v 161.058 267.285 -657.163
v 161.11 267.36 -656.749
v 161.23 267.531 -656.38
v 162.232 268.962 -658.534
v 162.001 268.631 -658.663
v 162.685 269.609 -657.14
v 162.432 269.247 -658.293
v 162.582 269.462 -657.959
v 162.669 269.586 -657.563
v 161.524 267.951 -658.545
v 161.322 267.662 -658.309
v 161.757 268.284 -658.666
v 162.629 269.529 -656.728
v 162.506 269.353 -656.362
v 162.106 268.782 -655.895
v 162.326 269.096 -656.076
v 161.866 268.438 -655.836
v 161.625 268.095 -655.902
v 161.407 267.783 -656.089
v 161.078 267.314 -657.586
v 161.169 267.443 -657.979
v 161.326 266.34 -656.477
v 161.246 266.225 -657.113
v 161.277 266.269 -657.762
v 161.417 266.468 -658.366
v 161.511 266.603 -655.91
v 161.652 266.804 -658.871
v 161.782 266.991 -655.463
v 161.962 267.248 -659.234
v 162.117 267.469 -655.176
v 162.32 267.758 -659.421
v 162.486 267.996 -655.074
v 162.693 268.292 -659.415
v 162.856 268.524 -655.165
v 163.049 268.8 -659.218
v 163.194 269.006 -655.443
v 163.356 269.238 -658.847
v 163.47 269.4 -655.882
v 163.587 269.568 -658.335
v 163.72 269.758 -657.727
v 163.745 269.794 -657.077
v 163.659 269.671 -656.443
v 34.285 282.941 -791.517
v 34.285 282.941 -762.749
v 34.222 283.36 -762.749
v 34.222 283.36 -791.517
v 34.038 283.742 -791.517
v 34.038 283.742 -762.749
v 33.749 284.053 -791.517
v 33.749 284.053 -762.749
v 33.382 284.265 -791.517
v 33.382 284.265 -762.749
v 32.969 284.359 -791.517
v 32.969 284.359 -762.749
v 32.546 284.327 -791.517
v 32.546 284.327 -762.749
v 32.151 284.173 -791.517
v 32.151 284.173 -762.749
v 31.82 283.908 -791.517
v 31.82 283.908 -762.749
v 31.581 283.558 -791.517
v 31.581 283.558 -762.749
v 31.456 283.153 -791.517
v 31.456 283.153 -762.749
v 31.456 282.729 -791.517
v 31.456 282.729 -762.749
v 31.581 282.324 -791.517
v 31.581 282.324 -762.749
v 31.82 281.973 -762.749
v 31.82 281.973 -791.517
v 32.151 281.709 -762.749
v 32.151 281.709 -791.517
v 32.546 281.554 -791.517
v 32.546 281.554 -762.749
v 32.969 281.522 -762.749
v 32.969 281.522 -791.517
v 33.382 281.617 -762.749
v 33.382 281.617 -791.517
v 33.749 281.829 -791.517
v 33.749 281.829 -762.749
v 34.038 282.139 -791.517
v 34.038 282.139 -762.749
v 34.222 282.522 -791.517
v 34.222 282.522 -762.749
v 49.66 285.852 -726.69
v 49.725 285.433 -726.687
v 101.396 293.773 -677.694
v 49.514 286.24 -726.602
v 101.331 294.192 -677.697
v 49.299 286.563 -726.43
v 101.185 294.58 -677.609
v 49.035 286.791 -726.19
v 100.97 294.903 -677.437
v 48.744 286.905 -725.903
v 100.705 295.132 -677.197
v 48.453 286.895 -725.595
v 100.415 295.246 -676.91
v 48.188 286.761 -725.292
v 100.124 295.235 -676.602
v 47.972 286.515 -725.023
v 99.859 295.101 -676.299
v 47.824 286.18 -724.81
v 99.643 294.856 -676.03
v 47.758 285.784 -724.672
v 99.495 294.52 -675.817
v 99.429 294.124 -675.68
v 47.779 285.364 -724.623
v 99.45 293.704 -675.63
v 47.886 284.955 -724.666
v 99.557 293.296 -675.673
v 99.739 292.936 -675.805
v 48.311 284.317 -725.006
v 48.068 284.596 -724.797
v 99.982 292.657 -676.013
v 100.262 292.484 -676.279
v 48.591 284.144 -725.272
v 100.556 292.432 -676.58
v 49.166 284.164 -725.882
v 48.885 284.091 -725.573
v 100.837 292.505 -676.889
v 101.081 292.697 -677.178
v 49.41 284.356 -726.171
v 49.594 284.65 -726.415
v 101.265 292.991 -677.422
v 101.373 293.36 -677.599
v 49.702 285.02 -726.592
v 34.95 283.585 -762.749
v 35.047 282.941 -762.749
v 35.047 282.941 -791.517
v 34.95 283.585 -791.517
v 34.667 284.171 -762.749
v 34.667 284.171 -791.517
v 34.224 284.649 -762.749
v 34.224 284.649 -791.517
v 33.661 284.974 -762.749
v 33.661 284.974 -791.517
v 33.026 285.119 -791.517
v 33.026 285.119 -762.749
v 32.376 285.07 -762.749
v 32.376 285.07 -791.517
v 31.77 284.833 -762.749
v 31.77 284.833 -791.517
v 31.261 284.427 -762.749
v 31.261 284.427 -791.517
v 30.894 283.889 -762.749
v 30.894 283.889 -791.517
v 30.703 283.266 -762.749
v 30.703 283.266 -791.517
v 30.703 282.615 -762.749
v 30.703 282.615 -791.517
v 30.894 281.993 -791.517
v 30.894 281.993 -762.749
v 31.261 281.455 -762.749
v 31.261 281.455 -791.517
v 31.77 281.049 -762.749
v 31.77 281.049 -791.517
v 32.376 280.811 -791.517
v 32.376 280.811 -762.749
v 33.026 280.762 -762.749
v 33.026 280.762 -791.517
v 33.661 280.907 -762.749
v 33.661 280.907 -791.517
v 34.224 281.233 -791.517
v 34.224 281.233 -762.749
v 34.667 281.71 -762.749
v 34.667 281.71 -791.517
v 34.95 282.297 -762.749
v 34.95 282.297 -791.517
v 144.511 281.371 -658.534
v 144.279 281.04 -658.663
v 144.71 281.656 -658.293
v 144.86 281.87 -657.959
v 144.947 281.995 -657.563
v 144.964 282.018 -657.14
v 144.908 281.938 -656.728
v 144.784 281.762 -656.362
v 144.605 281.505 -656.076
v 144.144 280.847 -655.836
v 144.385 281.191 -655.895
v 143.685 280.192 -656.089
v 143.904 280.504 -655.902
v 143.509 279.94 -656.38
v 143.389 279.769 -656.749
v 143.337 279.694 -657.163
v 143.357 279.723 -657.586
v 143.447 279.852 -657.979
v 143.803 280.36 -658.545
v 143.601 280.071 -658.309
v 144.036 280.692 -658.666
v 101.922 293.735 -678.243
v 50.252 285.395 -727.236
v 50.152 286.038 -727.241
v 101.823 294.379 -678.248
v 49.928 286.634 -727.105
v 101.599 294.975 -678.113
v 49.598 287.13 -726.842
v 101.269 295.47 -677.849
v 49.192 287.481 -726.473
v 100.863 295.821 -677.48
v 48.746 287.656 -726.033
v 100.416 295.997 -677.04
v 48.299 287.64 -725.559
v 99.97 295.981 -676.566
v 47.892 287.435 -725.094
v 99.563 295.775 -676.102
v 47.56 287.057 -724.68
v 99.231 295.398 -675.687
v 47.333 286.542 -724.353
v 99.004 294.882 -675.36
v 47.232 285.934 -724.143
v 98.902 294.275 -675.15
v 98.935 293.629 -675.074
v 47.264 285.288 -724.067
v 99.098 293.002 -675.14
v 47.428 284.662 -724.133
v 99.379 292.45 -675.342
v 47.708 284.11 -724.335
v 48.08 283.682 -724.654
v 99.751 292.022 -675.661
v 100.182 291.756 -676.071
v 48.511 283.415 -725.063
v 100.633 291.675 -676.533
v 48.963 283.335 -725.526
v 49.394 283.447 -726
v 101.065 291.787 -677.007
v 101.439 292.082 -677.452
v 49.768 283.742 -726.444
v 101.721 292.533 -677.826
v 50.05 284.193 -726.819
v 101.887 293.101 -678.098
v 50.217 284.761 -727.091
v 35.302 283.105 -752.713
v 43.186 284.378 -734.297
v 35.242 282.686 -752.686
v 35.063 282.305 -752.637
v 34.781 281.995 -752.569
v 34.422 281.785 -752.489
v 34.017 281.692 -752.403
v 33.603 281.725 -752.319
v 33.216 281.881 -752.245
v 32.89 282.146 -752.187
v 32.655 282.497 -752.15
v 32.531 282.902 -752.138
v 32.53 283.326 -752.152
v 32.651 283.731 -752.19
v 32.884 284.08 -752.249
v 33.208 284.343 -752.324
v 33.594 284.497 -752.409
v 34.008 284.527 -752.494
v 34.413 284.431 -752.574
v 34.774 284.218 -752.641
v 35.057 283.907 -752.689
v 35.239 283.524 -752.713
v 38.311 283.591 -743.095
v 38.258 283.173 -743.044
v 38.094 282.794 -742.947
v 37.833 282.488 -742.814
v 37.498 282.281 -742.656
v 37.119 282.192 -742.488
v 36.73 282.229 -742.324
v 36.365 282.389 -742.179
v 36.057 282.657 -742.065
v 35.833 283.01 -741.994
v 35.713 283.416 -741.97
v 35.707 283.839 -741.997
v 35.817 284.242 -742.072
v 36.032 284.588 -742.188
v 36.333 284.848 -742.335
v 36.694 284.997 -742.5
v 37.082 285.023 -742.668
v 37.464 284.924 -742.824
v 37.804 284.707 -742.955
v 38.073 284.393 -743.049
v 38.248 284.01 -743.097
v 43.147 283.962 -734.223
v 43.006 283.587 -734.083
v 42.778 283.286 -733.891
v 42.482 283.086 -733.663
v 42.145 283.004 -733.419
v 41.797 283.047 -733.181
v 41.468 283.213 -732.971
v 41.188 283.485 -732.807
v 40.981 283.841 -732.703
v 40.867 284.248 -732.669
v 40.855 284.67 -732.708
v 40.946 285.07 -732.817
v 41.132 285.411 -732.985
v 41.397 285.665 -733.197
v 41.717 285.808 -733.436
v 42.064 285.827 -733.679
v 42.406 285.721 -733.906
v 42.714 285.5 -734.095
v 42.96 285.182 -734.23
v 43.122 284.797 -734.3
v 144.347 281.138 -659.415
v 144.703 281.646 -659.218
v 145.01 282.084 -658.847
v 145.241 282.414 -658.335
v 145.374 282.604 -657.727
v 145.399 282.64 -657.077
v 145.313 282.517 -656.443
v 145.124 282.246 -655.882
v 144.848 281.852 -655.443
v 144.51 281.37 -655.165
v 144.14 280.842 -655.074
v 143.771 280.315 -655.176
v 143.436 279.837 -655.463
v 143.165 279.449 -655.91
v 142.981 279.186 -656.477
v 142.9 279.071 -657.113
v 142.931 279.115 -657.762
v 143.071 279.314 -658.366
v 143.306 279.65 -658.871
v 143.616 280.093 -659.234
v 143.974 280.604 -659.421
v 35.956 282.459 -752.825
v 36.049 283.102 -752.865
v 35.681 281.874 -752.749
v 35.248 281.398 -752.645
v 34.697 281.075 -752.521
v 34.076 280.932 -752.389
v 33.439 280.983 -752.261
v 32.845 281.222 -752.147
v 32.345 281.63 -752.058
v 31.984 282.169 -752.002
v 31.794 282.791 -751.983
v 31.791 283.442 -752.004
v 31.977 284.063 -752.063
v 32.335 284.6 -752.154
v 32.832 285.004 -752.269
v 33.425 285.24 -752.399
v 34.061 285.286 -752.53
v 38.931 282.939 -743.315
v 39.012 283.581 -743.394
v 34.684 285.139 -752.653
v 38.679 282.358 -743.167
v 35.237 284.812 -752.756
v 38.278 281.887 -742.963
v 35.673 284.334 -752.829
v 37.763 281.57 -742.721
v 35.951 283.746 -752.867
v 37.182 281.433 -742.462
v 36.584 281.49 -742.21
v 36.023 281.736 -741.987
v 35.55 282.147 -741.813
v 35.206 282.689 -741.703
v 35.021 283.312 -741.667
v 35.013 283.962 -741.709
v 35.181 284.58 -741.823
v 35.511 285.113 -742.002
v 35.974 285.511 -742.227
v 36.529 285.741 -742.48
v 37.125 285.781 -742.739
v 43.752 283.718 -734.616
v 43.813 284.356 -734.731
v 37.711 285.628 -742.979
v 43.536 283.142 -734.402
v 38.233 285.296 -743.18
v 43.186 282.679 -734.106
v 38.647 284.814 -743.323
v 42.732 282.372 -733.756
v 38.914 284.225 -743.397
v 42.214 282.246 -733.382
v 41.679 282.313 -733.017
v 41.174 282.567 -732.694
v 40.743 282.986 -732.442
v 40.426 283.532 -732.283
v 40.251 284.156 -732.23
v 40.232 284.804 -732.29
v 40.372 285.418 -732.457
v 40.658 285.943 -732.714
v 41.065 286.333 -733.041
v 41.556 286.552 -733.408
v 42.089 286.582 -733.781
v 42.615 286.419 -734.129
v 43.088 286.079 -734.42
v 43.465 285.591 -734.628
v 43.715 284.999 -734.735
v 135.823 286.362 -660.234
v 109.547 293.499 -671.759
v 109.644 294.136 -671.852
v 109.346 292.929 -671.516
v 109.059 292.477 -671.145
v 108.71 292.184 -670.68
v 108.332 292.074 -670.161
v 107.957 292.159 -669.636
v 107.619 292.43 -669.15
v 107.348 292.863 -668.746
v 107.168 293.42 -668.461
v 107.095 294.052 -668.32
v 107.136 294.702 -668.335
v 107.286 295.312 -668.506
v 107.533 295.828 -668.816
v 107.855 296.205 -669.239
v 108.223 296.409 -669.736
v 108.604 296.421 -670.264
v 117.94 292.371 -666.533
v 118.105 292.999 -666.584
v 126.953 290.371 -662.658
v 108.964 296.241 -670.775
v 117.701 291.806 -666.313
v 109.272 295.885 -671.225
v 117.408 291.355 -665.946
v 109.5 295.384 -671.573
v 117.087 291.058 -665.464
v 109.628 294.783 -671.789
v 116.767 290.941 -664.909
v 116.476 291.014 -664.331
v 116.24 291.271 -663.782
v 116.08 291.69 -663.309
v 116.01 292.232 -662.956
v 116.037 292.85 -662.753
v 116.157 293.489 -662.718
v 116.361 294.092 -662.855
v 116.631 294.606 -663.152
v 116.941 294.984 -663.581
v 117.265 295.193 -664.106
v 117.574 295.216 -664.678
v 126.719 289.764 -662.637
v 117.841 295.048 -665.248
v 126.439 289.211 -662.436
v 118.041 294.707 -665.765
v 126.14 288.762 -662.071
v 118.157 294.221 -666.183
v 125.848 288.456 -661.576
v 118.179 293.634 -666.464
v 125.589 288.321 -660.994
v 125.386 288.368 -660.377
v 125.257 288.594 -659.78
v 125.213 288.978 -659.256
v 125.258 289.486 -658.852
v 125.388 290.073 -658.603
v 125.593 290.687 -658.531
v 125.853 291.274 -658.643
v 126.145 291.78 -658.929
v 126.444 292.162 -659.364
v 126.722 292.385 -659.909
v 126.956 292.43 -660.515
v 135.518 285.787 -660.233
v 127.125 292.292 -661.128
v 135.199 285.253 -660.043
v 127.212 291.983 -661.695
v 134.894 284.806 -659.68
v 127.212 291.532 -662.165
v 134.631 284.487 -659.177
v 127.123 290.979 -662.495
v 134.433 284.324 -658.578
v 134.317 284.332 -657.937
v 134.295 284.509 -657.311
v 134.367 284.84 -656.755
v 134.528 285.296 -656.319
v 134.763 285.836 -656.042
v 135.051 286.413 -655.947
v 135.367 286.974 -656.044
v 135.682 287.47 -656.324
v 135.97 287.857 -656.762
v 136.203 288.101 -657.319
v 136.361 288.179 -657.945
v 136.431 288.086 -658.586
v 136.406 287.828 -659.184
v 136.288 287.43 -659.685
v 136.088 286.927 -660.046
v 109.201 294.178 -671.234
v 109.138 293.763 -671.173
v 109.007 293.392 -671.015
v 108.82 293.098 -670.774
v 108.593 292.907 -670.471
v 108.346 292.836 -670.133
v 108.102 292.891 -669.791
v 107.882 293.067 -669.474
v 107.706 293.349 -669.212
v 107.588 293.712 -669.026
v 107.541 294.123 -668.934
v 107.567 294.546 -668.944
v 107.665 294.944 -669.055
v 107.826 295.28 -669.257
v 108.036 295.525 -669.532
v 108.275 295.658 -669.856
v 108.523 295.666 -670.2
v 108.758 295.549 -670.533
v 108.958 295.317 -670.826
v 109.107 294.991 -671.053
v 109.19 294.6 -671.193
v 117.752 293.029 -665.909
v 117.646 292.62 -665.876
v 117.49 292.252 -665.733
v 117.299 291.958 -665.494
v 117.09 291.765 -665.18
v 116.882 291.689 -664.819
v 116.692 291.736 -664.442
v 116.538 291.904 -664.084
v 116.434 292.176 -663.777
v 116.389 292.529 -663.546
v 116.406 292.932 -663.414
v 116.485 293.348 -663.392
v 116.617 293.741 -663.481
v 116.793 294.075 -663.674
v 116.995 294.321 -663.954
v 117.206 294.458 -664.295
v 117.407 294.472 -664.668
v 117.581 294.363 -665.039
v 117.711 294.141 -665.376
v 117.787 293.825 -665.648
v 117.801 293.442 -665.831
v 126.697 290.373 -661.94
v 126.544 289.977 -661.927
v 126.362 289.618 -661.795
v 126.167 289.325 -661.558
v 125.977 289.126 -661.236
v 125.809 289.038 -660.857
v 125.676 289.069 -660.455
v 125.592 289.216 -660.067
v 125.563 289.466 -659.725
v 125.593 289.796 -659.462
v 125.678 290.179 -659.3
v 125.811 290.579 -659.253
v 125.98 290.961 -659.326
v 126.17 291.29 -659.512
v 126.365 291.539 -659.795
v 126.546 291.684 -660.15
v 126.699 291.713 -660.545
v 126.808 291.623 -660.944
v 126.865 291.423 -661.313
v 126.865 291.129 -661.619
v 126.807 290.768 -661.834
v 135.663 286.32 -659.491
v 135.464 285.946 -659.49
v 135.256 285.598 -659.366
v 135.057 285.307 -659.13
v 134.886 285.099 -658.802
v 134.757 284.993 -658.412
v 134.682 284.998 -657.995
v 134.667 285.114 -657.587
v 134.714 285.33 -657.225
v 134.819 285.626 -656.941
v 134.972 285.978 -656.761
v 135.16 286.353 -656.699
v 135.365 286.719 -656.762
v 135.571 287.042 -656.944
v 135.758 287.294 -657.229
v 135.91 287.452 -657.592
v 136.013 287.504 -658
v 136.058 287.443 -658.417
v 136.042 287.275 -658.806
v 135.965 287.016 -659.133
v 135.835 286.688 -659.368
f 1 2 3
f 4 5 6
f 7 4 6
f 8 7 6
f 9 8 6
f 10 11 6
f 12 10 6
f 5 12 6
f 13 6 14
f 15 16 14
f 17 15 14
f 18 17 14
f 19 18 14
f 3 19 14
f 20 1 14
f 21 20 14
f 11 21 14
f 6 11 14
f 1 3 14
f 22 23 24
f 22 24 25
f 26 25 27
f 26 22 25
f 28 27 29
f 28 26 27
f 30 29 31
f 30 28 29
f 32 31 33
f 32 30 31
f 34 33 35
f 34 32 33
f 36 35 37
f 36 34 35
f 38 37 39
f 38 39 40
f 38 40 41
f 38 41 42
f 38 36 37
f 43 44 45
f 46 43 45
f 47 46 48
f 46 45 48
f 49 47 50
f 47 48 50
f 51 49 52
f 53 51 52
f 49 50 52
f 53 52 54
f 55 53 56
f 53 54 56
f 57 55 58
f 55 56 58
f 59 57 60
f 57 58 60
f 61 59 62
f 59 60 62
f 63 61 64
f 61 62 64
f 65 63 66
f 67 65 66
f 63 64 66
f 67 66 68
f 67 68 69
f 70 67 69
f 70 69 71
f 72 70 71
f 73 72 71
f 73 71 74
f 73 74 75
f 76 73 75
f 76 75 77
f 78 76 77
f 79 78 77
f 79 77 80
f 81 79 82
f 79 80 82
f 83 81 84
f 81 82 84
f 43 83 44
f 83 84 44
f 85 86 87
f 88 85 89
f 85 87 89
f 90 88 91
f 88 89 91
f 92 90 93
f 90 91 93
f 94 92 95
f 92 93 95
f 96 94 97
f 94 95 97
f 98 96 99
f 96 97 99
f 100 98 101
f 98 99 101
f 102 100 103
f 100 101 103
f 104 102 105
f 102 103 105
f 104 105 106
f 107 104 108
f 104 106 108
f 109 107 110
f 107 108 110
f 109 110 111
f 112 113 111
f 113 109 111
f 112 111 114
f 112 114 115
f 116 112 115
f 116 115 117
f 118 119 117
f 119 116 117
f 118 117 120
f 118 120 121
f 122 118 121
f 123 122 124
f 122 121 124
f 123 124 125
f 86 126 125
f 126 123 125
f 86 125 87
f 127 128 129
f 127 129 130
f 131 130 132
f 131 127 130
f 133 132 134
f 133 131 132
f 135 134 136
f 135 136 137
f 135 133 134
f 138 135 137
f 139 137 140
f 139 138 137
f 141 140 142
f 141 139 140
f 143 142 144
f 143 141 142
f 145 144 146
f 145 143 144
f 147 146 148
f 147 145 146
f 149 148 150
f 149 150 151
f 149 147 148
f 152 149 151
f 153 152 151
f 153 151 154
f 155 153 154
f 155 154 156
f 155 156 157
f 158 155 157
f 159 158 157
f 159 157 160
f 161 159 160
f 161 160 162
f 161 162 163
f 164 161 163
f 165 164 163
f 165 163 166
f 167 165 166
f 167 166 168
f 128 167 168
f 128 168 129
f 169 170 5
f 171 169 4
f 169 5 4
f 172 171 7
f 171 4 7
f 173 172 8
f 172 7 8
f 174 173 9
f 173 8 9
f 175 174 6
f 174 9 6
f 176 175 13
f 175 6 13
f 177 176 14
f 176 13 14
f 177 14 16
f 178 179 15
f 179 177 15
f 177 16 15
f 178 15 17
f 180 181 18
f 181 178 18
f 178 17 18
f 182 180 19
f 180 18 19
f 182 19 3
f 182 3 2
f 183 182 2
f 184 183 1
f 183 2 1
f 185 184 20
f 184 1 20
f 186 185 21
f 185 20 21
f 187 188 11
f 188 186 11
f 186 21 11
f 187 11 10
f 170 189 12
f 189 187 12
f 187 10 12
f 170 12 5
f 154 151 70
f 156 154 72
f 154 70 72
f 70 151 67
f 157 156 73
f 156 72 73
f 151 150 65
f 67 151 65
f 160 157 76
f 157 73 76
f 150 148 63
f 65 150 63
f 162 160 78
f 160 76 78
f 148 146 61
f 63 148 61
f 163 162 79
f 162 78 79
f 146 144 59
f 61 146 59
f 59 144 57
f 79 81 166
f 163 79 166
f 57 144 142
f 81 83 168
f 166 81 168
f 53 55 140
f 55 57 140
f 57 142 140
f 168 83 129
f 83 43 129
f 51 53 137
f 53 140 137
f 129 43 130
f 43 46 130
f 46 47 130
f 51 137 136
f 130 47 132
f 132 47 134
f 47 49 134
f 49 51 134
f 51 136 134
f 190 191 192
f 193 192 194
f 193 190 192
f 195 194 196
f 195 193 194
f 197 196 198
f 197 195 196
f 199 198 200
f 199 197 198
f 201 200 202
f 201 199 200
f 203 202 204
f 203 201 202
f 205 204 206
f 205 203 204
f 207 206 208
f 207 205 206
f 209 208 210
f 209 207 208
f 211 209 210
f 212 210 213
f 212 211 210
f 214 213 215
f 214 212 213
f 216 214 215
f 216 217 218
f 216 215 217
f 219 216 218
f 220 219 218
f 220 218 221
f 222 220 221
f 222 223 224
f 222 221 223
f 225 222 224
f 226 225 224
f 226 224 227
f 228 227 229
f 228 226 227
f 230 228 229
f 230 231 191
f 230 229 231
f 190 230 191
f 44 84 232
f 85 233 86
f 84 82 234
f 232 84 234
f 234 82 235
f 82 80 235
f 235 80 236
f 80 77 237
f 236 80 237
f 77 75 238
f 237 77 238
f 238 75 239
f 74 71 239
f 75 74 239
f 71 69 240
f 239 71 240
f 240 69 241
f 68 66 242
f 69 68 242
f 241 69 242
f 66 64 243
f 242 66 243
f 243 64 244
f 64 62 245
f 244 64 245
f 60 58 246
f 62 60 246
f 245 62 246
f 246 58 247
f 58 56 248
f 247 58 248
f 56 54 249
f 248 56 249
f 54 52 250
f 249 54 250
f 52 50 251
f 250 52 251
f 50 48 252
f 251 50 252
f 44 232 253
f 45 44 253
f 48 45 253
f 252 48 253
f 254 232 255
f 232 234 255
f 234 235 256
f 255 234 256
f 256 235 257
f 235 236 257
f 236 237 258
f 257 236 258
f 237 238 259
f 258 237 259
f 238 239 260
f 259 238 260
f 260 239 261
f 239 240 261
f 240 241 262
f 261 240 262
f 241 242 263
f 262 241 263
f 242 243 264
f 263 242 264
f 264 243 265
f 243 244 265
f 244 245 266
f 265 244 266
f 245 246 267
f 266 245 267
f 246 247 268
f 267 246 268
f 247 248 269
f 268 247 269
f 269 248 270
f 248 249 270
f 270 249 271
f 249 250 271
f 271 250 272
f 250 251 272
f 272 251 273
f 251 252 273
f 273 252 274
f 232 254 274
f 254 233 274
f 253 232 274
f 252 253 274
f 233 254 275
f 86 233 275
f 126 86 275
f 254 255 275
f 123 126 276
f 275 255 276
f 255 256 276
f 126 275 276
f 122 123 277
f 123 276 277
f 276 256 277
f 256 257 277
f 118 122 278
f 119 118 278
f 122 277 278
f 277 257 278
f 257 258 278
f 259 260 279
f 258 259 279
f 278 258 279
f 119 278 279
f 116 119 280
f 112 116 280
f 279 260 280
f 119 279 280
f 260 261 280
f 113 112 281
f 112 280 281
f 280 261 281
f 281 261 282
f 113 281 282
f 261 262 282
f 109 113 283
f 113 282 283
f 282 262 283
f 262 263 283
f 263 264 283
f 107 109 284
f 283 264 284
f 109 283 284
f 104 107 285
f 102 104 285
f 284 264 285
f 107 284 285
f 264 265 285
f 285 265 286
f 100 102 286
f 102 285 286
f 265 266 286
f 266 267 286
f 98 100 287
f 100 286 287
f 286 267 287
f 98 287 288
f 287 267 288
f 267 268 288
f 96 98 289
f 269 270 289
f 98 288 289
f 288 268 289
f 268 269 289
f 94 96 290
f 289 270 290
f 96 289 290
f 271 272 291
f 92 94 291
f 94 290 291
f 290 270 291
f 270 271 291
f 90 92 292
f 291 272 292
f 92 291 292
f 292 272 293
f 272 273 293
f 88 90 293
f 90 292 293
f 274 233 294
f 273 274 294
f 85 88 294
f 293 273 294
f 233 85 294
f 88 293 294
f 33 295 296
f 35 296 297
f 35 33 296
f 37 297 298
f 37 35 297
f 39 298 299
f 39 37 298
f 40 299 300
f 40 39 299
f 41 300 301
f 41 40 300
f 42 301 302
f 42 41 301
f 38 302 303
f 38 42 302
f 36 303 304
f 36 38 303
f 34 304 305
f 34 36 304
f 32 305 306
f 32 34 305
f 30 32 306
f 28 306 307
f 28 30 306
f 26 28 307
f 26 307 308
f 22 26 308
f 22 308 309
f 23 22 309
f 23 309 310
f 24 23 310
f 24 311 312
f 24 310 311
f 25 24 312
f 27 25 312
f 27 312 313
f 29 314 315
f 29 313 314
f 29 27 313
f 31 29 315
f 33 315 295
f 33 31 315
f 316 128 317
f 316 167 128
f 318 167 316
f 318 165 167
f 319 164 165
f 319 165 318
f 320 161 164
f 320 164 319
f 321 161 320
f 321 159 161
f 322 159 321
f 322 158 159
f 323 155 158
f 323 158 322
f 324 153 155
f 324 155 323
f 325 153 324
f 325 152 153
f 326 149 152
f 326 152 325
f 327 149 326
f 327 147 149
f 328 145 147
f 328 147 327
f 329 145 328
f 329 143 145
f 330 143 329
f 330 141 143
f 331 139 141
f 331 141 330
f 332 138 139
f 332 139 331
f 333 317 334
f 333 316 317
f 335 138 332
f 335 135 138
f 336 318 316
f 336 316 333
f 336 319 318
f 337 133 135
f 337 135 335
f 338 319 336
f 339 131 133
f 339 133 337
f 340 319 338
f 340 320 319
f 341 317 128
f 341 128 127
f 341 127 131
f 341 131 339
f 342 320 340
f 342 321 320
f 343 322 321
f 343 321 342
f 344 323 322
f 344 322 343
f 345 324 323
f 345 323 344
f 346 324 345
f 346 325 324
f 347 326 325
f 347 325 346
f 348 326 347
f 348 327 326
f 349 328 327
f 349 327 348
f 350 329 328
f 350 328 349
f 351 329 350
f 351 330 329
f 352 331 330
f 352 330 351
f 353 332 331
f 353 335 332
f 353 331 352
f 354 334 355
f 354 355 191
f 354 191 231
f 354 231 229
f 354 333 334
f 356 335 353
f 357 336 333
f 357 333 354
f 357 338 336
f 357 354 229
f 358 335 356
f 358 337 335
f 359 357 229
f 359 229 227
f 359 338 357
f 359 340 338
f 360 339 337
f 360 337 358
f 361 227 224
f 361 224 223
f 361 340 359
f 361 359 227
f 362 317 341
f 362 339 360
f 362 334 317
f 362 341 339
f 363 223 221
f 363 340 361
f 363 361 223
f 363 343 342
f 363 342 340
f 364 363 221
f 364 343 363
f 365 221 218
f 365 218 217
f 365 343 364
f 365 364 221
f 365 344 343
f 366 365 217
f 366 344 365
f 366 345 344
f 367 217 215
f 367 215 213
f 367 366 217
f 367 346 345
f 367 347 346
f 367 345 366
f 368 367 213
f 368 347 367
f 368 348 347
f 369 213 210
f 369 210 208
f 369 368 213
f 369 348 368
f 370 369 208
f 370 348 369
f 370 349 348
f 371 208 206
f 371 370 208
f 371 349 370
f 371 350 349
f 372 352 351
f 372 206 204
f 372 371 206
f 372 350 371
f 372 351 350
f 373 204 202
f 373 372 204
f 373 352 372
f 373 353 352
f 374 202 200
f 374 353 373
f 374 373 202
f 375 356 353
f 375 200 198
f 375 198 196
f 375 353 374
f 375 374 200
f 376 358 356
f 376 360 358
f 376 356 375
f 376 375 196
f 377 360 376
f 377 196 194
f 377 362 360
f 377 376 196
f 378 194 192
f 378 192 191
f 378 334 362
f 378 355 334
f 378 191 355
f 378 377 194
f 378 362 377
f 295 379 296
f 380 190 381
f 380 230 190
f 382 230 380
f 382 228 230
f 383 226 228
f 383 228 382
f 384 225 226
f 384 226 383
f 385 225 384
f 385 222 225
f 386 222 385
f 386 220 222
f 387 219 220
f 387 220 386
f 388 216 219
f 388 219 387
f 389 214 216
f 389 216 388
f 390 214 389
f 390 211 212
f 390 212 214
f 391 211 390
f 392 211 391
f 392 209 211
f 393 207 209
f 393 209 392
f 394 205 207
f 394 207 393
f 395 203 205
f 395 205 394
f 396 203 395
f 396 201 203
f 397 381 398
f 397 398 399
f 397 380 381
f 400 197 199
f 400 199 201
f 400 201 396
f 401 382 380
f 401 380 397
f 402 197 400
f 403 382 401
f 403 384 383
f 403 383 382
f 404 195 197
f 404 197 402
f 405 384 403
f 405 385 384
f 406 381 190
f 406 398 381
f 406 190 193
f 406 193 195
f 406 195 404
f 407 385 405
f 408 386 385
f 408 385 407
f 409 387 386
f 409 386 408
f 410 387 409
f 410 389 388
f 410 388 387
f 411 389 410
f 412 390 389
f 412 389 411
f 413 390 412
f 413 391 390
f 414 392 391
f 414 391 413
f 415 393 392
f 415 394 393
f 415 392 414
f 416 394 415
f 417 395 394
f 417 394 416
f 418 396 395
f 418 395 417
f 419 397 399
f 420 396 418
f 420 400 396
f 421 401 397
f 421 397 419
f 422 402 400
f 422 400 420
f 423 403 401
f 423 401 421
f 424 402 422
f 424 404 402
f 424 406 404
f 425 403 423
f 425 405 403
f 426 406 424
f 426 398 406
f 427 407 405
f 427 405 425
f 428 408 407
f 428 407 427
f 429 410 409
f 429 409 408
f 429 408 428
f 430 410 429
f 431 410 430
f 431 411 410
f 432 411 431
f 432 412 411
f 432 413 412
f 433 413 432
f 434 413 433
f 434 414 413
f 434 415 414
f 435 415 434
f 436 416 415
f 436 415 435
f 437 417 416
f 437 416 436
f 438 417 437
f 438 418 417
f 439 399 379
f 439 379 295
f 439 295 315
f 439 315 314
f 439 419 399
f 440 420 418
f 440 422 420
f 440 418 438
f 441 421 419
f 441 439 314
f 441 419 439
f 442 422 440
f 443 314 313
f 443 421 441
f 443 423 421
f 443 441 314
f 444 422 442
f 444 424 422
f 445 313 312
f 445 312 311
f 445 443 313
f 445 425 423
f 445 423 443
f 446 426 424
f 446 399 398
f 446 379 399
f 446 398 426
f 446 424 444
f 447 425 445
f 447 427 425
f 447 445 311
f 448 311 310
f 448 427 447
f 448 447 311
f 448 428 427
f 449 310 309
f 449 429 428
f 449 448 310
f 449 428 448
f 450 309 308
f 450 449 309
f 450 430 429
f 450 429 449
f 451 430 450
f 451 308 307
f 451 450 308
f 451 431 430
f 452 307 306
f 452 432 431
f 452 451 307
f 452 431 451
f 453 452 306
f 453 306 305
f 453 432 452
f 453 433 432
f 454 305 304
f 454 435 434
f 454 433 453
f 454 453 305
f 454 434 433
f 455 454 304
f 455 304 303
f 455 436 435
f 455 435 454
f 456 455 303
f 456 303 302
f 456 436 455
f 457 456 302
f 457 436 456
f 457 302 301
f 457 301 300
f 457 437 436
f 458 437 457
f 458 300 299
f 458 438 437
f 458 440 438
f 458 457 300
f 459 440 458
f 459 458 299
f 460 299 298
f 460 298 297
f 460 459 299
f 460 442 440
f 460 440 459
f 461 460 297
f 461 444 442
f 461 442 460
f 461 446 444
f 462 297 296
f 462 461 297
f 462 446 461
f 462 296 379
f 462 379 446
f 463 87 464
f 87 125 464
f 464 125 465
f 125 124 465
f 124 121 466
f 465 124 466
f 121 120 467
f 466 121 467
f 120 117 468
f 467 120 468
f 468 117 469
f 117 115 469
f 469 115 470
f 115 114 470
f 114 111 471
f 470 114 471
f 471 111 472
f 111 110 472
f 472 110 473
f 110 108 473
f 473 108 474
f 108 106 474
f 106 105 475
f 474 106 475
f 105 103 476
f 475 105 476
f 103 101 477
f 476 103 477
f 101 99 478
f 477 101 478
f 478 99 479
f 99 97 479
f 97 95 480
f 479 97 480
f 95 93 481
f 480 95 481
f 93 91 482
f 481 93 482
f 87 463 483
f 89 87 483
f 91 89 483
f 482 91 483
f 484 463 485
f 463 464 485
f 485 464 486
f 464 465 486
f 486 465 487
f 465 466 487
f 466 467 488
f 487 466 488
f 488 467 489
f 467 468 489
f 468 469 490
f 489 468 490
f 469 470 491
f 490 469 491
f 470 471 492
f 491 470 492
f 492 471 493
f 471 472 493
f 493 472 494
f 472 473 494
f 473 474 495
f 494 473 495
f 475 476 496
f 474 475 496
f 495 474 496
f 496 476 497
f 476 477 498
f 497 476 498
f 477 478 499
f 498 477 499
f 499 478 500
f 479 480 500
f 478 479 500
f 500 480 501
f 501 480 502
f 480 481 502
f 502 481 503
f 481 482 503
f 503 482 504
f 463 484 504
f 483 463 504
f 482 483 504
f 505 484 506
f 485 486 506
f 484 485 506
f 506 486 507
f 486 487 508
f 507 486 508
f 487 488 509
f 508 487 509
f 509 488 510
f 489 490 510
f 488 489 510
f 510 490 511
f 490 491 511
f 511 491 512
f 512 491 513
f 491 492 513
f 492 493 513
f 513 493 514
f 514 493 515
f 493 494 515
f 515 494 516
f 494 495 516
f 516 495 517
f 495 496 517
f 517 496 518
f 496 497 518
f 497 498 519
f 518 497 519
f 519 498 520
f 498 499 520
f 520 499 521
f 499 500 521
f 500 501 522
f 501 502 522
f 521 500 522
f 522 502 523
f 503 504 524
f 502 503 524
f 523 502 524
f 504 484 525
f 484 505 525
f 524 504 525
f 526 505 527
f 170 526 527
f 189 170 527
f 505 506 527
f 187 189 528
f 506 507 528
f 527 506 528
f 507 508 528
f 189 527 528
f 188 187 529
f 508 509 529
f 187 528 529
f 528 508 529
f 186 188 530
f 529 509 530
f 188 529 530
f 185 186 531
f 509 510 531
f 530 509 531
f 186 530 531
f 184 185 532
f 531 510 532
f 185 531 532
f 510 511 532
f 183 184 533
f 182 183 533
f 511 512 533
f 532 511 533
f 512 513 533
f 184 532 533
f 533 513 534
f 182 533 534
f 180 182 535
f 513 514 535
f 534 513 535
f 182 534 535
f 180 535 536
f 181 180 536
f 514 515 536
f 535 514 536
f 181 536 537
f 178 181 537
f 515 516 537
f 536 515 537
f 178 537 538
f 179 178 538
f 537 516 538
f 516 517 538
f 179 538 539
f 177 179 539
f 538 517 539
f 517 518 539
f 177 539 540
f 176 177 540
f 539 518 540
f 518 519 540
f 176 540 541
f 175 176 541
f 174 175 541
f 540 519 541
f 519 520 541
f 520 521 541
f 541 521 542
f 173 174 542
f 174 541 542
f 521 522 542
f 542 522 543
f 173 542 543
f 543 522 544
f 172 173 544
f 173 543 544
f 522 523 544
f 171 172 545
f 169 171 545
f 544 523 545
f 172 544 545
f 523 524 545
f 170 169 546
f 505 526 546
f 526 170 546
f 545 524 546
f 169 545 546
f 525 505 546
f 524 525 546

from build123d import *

# Parameters (mm, degrees)
F6_R  = 2.1844
F19_T = -0.762


with BuildPart() as f18:
    # F18: sweep along a path in F17, F15
    with BuildLine(Plane(origin=(-43.675651977, 270.5866603644, 0), x_dir=(-0.9872223923, -0.1593485118, 0), z_dir=(-0.1593485118, 0.9872223923, 0))) as f18_path:
        Line((-77.5288046302, -791.51734), (-77.5288046302, -762.7486817052))
        ThreePointArc((-77.5288046302, -762.7486817052), (-81.7230084447, -742.536315146), (-93.6130472254, -725.6615385445))
        Line((-93.6130472254, -725.6615385445), (-145.952605517, -676.668619342))
    with BuildLine(Plane(origin=(295.9948145741, 422.72440444, -384.1351665385), x_dir=(-0.8878667779, 0.3405109306, -0.3094267131), z_dir=(0.4601006245, 0.6570917897, -0.597107859))) as f18_path_2:
        ThreePointArc((220.2839333931, -303.1725531038), (196.3863531805, -293.9385533264), (171.0214128625, -297.5414541816))
        Line((171.0214128625, -297.5414541816), (150.3584973451, -306.1806072573))
    # F6 (on line) → F18 (sweep)
    with BuildSketch(Plane.XY.offset(-791.51734)):
        with Locations((32.86252, 282.94076)):
            Circle(F6_R)
    sweep(path=f18_path.line + f18_path_2.line)

    # F19
    f19_openings = [f18.faces().sort_by_distance(p)[0] for p in [
        (32.86252, 282.94076, -791.51734),
    ]]
    offset(amount=F19_T, openings=f19_openings)


solid = f18.part
